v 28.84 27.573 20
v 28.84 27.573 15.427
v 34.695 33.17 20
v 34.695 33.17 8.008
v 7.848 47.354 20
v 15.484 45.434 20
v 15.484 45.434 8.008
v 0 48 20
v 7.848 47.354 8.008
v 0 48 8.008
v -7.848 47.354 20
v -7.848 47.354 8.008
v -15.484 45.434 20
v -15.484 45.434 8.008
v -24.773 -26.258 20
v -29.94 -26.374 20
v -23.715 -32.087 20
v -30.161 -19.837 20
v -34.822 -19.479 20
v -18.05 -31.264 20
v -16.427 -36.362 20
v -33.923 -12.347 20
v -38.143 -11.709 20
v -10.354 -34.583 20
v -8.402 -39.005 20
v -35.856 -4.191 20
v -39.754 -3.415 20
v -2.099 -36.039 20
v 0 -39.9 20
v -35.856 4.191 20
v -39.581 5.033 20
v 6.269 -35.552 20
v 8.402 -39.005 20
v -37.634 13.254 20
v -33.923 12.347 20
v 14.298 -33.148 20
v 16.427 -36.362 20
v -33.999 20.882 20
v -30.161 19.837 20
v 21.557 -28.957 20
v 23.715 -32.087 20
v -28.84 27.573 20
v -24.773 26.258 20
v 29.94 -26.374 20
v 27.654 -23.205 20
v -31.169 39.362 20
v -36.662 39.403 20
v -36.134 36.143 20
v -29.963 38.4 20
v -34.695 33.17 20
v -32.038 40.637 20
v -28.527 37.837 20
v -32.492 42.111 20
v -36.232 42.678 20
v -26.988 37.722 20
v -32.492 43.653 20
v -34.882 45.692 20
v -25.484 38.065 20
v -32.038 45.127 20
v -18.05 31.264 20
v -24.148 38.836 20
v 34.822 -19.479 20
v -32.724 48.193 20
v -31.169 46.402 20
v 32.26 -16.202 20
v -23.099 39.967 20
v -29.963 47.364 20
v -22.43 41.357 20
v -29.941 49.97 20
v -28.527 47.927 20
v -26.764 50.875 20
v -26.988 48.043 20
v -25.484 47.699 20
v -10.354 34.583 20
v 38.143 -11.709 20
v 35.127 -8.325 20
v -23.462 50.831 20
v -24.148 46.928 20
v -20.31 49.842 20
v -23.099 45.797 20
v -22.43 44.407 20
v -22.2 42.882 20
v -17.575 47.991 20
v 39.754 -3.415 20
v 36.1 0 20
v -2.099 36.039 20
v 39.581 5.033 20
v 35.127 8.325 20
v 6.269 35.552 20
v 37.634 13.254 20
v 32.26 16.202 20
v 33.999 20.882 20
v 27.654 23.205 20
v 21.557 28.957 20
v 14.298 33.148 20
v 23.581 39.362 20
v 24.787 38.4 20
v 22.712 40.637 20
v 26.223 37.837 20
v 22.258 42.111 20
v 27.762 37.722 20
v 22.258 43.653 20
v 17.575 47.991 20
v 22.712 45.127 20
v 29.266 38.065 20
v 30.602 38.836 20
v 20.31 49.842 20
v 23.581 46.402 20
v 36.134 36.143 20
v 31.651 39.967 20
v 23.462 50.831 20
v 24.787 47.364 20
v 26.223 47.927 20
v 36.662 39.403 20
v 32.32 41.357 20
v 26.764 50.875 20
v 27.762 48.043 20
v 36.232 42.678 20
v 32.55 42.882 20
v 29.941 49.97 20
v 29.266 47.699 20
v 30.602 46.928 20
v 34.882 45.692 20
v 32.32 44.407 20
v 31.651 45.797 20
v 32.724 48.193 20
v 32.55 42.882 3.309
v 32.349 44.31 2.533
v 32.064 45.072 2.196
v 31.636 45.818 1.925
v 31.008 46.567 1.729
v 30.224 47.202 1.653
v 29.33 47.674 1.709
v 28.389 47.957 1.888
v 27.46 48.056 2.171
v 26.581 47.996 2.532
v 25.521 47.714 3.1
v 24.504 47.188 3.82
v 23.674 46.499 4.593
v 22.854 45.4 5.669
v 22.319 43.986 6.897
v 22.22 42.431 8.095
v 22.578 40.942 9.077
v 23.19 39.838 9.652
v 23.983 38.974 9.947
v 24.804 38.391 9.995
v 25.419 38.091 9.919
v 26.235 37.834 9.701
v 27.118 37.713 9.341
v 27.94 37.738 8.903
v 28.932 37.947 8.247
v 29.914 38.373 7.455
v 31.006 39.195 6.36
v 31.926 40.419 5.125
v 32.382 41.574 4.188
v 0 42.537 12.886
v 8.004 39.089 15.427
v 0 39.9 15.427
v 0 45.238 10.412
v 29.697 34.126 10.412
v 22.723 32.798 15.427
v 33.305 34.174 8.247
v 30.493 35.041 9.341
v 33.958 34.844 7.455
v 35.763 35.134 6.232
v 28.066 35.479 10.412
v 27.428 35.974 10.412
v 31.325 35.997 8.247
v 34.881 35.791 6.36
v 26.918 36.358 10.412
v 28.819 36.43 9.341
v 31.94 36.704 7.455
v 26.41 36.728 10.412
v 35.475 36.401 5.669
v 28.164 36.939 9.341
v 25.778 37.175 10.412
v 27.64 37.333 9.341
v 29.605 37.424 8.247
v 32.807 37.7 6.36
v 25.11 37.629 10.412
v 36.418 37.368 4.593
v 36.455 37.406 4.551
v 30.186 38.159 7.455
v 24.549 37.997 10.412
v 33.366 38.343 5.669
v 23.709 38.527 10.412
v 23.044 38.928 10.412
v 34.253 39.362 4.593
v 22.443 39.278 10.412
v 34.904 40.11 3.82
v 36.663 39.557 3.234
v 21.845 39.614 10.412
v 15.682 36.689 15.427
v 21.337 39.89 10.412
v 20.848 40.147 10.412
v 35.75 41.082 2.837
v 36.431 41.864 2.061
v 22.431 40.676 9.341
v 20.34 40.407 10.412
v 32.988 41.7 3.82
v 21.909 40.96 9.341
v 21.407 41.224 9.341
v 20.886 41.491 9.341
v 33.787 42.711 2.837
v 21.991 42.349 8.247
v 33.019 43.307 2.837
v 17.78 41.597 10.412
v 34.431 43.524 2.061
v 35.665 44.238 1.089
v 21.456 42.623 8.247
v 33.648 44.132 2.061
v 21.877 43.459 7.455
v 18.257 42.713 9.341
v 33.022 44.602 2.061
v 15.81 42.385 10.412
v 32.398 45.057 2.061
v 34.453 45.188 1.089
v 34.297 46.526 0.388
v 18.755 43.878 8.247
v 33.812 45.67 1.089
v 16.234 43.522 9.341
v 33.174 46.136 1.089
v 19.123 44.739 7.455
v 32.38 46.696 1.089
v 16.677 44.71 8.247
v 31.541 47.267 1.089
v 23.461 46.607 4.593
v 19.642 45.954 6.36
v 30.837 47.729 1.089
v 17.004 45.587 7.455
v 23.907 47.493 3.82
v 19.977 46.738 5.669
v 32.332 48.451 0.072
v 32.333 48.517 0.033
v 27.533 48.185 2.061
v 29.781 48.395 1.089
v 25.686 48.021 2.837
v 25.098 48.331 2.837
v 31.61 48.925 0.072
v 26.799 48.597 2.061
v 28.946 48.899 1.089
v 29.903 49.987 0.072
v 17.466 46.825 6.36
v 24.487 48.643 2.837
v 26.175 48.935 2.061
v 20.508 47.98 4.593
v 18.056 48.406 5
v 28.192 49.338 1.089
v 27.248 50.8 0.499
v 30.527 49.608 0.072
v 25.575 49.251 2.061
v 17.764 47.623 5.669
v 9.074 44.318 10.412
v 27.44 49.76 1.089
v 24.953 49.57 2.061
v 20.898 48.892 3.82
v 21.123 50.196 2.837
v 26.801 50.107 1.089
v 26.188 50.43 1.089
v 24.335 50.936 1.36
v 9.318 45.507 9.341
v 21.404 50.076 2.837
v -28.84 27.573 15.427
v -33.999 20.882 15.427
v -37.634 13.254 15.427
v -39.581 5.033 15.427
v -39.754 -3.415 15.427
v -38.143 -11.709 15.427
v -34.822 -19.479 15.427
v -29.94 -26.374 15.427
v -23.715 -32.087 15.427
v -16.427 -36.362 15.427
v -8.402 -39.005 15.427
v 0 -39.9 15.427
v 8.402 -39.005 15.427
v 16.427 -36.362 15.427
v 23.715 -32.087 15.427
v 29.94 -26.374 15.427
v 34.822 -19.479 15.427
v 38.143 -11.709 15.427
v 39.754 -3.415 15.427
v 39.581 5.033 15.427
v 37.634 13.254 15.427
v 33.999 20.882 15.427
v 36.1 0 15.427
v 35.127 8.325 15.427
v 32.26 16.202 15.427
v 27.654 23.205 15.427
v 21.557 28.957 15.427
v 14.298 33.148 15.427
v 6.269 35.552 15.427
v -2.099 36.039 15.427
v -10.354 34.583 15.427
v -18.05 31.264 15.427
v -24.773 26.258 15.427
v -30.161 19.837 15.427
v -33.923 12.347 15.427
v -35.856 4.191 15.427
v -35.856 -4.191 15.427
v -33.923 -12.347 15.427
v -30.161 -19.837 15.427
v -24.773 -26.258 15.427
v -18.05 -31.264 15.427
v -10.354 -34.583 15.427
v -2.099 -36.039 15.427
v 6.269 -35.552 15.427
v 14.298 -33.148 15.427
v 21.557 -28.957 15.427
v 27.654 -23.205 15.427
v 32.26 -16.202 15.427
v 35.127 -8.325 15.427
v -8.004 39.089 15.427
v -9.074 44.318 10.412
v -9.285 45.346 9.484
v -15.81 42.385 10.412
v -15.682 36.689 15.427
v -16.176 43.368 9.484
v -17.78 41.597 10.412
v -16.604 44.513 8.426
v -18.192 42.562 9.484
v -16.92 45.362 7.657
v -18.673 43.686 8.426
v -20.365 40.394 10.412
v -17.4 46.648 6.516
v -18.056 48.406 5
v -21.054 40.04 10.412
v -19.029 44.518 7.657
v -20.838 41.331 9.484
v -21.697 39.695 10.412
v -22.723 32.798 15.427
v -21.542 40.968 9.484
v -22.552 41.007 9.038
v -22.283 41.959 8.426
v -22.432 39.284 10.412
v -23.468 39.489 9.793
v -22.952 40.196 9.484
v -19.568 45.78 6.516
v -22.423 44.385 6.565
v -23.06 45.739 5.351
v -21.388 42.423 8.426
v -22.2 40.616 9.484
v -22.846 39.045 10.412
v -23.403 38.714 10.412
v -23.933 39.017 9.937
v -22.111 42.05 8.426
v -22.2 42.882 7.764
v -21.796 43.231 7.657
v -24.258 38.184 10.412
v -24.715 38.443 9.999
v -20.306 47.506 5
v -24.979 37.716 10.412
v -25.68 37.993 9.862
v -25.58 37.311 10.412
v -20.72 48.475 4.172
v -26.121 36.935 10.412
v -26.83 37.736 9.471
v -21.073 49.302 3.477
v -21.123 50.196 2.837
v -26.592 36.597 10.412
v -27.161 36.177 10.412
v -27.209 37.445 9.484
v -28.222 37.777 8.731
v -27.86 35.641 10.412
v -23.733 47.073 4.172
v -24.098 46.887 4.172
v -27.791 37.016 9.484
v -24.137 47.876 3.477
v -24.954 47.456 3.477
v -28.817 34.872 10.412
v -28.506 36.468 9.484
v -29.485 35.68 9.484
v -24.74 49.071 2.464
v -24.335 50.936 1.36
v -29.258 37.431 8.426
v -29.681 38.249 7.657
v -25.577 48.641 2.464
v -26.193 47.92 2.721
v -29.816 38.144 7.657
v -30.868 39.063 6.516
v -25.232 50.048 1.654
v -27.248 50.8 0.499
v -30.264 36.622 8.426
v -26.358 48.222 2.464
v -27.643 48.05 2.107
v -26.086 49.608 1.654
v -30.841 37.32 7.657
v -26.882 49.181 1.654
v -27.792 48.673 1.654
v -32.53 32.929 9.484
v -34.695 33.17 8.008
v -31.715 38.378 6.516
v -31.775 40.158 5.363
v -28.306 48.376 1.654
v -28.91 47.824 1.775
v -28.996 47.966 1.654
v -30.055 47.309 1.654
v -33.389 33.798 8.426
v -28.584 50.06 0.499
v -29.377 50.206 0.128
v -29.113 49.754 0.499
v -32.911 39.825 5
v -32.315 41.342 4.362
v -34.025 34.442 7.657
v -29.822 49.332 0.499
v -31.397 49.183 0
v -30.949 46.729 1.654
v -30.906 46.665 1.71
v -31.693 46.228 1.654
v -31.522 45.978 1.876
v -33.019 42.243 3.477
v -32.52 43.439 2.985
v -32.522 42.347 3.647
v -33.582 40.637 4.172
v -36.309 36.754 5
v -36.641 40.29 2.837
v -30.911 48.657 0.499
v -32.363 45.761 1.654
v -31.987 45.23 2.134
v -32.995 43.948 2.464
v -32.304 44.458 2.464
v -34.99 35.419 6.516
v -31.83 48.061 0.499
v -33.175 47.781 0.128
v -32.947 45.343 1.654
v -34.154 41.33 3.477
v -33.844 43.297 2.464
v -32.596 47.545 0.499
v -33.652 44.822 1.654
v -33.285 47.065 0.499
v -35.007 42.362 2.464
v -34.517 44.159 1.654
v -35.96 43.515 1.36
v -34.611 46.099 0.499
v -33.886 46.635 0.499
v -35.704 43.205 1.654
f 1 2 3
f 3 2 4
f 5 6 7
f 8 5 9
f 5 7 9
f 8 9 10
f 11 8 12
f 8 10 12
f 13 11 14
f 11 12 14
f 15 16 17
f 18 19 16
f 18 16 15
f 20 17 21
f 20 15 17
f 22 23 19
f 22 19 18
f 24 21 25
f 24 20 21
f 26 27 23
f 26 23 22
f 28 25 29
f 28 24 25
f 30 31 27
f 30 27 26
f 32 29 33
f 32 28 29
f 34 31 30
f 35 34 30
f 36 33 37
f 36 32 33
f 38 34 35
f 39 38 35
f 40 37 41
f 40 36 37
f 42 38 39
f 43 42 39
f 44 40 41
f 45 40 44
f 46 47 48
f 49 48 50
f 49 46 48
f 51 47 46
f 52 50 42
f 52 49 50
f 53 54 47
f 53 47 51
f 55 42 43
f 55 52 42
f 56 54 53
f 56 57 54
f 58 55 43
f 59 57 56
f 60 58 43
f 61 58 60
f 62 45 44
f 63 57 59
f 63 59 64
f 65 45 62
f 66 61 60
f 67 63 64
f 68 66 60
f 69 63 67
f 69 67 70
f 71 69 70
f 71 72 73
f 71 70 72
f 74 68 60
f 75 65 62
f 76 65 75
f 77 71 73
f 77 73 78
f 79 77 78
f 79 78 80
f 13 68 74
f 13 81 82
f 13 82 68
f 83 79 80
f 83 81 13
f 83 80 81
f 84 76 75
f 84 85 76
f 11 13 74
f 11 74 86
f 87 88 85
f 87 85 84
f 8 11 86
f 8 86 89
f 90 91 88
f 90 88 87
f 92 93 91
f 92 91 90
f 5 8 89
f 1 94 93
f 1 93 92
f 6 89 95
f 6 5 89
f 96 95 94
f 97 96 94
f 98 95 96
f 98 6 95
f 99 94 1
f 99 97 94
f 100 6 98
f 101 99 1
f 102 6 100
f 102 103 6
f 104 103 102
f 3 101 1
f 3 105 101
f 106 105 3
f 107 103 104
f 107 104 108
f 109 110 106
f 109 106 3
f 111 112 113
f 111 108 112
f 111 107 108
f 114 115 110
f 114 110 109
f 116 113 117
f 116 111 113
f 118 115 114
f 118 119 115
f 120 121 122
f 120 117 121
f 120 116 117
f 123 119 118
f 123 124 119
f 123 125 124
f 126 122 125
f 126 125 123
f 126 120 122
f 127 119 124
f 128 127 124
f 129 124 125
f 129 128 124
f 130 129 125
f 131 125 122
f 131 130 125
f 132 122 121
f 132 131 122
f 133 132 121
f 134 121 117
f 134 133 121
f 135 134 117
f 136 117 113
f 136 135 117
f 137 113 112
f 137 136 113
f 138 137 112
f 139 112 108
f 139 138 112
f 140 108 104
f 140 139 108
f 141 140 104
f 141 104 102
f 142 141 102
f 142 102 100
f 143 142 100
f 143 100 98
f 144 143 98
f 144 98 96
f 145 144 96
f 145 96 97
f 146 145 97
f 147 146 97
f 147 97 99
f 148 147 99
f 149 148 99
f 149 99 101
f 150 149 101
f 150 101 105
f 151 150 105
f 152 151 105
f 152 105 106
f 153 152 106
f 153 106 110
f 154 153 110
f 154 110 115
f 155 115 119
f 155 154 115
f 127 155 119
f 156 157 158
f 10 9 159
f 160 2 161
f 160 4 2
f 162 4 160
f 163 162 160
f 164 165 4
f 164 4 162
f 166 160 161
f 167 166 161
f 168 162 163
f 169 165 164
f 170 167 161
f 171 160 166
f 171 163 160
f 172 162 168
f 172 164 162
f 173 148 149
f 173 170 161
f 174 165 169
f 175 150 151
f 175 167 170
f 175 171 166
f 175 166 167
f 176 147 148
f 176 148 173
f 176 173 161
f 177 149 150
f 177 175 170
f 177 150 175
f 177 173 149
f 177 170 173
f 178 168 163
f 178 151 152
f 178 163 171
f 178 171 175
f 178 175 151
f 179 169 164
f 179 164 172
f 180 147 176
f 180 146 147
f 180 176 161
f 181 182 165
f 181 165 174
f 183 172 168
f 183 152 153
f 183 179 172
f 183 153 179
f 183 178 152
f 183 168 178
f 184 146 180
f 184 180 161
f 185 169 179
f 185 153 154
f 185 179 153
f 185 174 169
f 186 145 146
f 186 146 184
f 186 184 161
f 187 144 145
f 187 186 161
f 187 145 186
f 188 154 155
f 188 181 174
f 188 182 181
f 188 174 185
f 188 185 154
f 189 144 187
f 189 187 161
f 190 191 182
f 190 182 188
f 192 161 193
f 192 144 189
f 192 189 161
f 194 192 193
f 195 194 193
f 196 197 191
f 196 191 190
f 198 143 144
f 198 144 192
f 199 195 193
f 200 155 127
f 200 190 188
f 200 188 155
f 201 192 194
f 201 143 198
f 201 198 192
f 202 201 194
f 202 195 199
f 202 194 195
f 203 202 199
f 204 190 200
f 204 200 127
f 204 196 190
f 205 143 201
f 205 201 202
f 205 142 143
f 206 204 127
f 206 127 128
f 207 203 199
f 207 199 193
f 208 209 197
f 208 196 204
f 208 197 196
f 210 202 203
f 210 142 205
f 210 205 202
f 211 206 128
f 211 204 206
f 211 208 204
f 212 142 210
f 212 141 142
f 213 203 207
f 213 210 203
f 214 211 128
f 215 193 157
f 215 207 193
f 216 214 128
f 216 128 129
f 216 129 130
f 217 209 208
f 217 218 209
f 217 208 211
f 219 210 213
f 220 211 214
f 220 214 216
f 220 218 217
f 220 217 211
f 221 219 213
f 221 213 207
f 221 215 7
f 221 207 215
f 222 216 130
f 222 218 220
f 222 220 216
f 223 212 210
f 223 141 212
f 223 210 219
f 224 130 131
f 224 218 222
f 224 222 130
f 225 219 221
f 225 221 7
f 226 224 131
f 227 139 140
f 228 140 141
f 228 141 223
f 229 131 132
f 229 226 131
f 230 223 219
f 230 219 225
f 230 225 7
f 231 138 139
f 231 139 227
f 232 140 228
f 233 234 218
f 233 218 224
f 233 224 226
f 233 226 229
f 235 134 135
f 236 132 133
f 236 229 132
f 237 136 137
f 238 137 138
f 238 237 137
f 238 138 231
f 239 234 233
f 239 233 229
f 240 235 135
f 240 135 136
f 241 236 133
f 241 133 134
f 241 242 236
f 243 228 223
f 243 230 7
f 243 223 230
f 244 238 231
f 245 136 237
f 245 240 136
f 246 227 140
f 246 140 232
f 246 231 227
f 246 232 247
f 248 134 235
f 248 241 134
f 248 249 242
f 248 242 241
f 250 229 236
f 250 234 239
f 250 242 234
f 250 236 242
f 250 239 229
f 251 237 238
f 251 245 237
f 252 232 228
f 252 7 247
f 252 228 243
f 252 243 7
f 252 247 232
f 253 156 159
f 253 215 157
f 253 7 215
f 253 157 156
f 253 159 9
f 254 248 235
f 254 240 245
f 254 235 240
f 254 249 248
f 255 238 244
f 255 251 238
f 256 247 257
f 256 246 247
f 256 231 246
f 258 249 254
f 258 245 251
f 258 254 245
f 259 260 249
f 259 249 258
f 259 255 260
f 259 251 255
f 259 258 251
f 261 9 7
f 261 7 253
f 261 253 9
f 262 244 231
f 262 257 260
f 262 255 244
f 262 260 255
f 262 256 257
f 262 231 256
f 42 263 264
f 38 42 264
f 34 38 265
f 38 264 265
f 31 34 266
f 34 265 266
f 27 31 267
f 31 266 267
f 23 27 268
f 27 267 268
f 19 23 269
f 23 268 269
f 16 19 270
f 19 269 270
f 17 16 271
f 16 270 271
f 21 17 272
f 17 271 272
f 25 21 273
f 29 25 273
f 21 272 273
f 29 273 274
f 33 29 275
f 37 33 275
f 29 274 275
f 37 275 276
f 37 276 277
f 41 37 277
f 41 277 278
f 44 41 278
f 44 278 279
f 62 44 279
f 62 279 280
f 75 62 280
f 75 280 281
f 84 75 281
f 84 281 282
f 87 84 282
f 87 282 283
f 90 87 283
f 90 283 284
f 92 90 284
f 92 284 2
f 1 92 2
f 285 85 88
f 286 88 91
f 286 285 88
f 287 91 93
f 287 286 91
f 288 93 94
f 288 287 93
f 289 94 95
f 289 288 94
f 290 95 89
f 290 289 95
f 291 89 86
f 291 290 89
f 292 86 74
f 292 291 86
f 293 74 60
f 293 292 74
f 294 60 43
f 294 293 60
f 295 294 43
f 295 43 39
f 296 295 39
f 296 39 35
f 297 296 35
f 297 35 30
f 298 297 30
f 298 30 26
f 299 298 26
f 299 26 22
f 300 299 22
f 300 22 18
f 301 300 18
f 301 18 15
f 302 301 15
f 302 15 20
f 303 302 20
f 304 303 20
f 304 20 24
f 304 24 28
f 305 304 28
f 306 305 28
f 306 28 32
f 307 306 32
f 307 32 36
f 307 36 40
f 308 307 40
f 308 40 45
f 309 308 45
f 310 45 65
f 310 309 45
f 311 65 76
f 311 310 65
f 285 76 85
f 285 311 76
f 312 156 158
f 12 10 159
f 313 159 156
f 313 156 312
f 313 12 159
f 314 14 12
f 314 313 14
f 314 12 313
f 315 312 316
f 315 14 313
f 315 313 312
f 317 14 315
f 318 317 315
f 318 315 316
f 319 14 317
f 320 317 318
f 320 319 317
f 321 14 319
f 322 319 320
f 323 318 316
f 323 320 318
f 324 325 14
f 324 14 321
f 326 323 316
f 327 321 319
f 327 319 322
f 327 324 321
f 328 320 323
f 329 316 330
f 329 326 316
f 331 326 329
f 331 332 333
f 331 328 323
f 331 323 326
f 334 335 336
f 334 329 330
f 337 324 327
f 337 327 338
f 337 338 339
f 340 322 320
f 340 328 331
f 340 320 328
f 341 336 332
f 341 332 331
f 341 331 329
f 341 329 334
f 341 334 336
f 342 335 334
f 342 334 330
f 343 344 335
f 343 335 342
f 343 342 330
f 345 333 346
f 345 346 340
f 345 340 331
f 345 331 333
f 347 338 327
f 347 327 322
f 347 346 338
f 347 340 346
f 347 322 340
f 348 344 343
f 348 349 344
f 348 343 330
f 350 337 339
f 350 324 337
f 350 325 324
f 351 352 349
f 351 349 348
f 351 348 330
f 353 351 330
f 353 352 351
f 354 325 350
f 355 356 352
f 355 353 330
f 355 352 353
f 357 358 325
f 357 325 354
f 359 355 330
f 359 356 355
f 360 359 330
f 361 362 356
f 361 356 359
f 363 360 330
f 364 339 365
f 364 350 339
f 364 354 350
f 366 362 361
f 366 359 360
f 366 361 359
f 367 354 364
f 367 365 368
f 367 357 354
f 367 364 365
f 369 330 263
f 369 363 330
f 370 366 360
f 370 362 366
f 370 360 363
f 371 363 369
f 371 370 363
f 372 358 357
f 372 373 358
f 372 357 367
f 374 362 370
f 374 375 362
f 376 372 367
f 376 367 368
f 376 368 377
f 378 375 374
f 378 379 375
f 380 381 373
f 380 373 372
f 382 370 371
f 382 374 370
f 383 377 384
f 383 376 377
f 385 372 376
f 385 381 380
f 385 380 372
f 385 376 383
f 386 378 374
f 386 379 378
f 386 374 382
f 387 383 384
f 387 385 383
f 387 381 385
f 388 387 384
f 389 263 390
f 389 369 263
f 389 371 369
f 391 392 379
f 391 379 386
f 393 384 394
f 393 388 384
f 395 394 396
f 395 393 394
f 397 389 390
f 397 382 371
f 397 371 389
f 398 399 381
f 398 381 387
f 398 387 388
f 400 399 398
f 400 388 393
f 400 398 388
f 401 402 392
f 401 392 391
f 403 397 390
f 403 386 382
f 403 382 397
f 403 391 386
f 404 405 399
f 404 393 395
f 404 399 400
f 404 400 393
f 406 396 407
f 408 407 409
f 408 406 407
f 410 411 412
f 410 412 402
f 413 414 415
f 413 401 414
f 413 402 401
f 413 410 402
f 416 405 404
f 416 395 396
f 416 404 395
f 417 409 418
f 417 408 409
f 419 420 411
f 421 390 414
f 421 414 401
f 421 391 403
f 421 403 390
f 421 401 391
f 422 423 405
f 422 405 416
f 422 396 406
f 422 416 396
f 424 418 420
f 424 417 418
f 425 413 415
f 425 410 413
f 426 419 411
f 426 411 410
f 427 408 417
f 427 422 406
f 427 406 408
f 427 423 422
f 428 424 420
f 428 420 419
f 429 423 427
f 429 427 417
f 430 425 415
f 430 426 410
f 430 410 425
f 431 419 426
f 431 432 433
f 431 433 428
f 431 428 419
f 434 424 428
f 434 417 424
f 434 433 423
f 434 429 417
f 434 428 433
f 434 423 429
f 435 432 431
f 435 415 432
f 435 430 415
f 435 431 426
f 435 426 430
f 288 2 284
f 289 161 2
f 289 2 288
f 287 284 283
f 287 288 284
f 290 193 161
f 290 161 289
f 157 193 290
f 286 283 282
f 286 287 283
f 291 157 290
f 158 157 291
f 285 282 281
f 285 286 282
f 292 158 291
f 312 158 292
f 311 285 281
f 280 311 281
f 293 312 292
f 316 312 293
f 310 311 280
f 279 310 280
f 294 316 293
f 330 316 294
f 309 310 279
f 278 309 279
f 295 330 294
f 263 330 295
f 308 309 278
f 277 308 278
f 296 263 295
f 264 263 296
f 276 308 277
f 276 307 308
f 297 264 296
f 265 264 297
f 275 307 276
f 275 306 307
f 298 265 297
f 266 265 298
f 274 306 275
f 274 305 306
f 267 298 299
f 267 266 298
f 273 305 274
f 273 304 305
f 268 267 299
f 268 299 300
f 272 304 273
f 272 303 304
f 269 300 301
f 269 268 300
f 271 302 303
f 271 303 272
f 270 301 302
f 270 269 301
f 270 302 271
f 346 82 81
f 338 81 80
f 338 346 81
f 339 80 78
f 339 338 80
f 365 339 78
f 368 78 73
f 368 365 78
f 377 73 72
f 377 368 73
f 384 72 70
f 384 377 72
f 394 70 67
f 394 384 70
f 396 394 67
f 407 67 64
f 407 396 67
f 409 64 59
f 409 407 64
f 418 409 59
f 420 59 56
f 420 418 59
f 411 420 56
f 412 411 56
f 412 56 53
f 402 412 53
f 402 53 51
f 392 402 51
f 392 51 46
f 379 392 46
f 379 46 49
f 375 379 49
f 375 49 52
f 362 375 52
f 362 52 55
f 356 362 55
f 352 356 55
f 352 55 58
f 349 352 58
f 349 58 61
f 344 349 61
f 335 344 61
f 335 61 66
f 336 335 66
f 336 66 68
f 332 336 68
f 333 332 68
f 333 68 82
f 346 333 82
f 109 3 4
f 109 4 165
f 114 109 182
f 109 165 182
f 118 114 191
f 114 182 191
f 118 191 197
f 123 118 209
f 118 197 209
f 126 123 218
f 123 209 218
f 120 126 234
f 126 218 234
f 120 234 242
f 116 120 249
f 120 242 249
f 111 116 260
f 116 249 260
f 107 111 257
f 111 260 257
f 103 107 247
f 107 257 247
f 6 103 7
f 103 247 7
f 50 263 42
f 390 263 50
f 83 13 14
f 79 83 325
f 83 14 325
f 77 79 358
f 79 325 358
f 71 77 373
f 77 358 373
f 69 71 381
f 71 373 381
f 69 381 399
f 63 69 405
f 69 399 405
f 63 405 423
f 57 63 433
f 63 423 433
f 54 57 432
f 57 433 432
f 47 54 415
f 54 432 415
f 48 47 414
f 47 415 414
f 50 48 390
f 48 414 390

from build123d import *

# Parameters (mm, degrees)
SKETCH_R   = 5.175
SKETCH_R_2 = 36.1
PAD_DEPTH  = 20


with BuildPart() as chamfer_cutout_right:
    # Sketch002 → Revolution (revolve)
    with BuildSketch(Plane.YZ):
        with BuildLine():
            Line((36.1, 15.427249), (39.9, 15.427249))
            ThreePointArc((39.9, 15.427249), (48.804267, 7.330048), (58.35, 0))
            Line((58.35, 0), (58.35, -5))
            Line((58.35, -5), (36.1, -5))
            Line((36.1, -5), (36.1, 15.427249))
        make_face()
    revolve(axis=Axis((0, 0, 0), (0, 0, 1)))


with BuildPart() as spacer_right:
    # Sketch → Pad (new body)
    with BuildSketch(Plane.XY):
        with BuildLine():
            ThreePointArc((-15.484484, 45.433806), (-31.397174, 49.18272), (-34.694729, 33.170405))
            Line((-28.839993, 27.572899), (-34.694729, 33.170405))
            ThreePointArc((-28.839993, 27.572899), (0, -39.9), (28.839993, 27.572899))
            Line((28.839993, 27.572899), (34.694729, 33.170405))
            ThreePointArc((34.694729, 33.170405), (31.397174, 49.18272), (15.484484, 45.433806))
            ThreePointArc((15.484484, 45.433806), (0, 48), (-15.484484, 45.433806))
        make_face()
        with Locations((-27.375, 42.882106)):
            Circle(SKETCH_R, mode=Mode.SUBTRACT)
        with Locations((27.375, 42.882106)):
            Circle(SKETCH_R, mode=Mode.SUBTRACT)
        Circle(SKETCH_R_2, mode=Mode.SUBTRACT)
    extrude(amount=PAD_DEPTH)

    # Cut: cut chamfer_cutout_right
    add(chamfer_cutout_right.part, mode=Mode.SUBTRACT)


solid = spacer_right.part
